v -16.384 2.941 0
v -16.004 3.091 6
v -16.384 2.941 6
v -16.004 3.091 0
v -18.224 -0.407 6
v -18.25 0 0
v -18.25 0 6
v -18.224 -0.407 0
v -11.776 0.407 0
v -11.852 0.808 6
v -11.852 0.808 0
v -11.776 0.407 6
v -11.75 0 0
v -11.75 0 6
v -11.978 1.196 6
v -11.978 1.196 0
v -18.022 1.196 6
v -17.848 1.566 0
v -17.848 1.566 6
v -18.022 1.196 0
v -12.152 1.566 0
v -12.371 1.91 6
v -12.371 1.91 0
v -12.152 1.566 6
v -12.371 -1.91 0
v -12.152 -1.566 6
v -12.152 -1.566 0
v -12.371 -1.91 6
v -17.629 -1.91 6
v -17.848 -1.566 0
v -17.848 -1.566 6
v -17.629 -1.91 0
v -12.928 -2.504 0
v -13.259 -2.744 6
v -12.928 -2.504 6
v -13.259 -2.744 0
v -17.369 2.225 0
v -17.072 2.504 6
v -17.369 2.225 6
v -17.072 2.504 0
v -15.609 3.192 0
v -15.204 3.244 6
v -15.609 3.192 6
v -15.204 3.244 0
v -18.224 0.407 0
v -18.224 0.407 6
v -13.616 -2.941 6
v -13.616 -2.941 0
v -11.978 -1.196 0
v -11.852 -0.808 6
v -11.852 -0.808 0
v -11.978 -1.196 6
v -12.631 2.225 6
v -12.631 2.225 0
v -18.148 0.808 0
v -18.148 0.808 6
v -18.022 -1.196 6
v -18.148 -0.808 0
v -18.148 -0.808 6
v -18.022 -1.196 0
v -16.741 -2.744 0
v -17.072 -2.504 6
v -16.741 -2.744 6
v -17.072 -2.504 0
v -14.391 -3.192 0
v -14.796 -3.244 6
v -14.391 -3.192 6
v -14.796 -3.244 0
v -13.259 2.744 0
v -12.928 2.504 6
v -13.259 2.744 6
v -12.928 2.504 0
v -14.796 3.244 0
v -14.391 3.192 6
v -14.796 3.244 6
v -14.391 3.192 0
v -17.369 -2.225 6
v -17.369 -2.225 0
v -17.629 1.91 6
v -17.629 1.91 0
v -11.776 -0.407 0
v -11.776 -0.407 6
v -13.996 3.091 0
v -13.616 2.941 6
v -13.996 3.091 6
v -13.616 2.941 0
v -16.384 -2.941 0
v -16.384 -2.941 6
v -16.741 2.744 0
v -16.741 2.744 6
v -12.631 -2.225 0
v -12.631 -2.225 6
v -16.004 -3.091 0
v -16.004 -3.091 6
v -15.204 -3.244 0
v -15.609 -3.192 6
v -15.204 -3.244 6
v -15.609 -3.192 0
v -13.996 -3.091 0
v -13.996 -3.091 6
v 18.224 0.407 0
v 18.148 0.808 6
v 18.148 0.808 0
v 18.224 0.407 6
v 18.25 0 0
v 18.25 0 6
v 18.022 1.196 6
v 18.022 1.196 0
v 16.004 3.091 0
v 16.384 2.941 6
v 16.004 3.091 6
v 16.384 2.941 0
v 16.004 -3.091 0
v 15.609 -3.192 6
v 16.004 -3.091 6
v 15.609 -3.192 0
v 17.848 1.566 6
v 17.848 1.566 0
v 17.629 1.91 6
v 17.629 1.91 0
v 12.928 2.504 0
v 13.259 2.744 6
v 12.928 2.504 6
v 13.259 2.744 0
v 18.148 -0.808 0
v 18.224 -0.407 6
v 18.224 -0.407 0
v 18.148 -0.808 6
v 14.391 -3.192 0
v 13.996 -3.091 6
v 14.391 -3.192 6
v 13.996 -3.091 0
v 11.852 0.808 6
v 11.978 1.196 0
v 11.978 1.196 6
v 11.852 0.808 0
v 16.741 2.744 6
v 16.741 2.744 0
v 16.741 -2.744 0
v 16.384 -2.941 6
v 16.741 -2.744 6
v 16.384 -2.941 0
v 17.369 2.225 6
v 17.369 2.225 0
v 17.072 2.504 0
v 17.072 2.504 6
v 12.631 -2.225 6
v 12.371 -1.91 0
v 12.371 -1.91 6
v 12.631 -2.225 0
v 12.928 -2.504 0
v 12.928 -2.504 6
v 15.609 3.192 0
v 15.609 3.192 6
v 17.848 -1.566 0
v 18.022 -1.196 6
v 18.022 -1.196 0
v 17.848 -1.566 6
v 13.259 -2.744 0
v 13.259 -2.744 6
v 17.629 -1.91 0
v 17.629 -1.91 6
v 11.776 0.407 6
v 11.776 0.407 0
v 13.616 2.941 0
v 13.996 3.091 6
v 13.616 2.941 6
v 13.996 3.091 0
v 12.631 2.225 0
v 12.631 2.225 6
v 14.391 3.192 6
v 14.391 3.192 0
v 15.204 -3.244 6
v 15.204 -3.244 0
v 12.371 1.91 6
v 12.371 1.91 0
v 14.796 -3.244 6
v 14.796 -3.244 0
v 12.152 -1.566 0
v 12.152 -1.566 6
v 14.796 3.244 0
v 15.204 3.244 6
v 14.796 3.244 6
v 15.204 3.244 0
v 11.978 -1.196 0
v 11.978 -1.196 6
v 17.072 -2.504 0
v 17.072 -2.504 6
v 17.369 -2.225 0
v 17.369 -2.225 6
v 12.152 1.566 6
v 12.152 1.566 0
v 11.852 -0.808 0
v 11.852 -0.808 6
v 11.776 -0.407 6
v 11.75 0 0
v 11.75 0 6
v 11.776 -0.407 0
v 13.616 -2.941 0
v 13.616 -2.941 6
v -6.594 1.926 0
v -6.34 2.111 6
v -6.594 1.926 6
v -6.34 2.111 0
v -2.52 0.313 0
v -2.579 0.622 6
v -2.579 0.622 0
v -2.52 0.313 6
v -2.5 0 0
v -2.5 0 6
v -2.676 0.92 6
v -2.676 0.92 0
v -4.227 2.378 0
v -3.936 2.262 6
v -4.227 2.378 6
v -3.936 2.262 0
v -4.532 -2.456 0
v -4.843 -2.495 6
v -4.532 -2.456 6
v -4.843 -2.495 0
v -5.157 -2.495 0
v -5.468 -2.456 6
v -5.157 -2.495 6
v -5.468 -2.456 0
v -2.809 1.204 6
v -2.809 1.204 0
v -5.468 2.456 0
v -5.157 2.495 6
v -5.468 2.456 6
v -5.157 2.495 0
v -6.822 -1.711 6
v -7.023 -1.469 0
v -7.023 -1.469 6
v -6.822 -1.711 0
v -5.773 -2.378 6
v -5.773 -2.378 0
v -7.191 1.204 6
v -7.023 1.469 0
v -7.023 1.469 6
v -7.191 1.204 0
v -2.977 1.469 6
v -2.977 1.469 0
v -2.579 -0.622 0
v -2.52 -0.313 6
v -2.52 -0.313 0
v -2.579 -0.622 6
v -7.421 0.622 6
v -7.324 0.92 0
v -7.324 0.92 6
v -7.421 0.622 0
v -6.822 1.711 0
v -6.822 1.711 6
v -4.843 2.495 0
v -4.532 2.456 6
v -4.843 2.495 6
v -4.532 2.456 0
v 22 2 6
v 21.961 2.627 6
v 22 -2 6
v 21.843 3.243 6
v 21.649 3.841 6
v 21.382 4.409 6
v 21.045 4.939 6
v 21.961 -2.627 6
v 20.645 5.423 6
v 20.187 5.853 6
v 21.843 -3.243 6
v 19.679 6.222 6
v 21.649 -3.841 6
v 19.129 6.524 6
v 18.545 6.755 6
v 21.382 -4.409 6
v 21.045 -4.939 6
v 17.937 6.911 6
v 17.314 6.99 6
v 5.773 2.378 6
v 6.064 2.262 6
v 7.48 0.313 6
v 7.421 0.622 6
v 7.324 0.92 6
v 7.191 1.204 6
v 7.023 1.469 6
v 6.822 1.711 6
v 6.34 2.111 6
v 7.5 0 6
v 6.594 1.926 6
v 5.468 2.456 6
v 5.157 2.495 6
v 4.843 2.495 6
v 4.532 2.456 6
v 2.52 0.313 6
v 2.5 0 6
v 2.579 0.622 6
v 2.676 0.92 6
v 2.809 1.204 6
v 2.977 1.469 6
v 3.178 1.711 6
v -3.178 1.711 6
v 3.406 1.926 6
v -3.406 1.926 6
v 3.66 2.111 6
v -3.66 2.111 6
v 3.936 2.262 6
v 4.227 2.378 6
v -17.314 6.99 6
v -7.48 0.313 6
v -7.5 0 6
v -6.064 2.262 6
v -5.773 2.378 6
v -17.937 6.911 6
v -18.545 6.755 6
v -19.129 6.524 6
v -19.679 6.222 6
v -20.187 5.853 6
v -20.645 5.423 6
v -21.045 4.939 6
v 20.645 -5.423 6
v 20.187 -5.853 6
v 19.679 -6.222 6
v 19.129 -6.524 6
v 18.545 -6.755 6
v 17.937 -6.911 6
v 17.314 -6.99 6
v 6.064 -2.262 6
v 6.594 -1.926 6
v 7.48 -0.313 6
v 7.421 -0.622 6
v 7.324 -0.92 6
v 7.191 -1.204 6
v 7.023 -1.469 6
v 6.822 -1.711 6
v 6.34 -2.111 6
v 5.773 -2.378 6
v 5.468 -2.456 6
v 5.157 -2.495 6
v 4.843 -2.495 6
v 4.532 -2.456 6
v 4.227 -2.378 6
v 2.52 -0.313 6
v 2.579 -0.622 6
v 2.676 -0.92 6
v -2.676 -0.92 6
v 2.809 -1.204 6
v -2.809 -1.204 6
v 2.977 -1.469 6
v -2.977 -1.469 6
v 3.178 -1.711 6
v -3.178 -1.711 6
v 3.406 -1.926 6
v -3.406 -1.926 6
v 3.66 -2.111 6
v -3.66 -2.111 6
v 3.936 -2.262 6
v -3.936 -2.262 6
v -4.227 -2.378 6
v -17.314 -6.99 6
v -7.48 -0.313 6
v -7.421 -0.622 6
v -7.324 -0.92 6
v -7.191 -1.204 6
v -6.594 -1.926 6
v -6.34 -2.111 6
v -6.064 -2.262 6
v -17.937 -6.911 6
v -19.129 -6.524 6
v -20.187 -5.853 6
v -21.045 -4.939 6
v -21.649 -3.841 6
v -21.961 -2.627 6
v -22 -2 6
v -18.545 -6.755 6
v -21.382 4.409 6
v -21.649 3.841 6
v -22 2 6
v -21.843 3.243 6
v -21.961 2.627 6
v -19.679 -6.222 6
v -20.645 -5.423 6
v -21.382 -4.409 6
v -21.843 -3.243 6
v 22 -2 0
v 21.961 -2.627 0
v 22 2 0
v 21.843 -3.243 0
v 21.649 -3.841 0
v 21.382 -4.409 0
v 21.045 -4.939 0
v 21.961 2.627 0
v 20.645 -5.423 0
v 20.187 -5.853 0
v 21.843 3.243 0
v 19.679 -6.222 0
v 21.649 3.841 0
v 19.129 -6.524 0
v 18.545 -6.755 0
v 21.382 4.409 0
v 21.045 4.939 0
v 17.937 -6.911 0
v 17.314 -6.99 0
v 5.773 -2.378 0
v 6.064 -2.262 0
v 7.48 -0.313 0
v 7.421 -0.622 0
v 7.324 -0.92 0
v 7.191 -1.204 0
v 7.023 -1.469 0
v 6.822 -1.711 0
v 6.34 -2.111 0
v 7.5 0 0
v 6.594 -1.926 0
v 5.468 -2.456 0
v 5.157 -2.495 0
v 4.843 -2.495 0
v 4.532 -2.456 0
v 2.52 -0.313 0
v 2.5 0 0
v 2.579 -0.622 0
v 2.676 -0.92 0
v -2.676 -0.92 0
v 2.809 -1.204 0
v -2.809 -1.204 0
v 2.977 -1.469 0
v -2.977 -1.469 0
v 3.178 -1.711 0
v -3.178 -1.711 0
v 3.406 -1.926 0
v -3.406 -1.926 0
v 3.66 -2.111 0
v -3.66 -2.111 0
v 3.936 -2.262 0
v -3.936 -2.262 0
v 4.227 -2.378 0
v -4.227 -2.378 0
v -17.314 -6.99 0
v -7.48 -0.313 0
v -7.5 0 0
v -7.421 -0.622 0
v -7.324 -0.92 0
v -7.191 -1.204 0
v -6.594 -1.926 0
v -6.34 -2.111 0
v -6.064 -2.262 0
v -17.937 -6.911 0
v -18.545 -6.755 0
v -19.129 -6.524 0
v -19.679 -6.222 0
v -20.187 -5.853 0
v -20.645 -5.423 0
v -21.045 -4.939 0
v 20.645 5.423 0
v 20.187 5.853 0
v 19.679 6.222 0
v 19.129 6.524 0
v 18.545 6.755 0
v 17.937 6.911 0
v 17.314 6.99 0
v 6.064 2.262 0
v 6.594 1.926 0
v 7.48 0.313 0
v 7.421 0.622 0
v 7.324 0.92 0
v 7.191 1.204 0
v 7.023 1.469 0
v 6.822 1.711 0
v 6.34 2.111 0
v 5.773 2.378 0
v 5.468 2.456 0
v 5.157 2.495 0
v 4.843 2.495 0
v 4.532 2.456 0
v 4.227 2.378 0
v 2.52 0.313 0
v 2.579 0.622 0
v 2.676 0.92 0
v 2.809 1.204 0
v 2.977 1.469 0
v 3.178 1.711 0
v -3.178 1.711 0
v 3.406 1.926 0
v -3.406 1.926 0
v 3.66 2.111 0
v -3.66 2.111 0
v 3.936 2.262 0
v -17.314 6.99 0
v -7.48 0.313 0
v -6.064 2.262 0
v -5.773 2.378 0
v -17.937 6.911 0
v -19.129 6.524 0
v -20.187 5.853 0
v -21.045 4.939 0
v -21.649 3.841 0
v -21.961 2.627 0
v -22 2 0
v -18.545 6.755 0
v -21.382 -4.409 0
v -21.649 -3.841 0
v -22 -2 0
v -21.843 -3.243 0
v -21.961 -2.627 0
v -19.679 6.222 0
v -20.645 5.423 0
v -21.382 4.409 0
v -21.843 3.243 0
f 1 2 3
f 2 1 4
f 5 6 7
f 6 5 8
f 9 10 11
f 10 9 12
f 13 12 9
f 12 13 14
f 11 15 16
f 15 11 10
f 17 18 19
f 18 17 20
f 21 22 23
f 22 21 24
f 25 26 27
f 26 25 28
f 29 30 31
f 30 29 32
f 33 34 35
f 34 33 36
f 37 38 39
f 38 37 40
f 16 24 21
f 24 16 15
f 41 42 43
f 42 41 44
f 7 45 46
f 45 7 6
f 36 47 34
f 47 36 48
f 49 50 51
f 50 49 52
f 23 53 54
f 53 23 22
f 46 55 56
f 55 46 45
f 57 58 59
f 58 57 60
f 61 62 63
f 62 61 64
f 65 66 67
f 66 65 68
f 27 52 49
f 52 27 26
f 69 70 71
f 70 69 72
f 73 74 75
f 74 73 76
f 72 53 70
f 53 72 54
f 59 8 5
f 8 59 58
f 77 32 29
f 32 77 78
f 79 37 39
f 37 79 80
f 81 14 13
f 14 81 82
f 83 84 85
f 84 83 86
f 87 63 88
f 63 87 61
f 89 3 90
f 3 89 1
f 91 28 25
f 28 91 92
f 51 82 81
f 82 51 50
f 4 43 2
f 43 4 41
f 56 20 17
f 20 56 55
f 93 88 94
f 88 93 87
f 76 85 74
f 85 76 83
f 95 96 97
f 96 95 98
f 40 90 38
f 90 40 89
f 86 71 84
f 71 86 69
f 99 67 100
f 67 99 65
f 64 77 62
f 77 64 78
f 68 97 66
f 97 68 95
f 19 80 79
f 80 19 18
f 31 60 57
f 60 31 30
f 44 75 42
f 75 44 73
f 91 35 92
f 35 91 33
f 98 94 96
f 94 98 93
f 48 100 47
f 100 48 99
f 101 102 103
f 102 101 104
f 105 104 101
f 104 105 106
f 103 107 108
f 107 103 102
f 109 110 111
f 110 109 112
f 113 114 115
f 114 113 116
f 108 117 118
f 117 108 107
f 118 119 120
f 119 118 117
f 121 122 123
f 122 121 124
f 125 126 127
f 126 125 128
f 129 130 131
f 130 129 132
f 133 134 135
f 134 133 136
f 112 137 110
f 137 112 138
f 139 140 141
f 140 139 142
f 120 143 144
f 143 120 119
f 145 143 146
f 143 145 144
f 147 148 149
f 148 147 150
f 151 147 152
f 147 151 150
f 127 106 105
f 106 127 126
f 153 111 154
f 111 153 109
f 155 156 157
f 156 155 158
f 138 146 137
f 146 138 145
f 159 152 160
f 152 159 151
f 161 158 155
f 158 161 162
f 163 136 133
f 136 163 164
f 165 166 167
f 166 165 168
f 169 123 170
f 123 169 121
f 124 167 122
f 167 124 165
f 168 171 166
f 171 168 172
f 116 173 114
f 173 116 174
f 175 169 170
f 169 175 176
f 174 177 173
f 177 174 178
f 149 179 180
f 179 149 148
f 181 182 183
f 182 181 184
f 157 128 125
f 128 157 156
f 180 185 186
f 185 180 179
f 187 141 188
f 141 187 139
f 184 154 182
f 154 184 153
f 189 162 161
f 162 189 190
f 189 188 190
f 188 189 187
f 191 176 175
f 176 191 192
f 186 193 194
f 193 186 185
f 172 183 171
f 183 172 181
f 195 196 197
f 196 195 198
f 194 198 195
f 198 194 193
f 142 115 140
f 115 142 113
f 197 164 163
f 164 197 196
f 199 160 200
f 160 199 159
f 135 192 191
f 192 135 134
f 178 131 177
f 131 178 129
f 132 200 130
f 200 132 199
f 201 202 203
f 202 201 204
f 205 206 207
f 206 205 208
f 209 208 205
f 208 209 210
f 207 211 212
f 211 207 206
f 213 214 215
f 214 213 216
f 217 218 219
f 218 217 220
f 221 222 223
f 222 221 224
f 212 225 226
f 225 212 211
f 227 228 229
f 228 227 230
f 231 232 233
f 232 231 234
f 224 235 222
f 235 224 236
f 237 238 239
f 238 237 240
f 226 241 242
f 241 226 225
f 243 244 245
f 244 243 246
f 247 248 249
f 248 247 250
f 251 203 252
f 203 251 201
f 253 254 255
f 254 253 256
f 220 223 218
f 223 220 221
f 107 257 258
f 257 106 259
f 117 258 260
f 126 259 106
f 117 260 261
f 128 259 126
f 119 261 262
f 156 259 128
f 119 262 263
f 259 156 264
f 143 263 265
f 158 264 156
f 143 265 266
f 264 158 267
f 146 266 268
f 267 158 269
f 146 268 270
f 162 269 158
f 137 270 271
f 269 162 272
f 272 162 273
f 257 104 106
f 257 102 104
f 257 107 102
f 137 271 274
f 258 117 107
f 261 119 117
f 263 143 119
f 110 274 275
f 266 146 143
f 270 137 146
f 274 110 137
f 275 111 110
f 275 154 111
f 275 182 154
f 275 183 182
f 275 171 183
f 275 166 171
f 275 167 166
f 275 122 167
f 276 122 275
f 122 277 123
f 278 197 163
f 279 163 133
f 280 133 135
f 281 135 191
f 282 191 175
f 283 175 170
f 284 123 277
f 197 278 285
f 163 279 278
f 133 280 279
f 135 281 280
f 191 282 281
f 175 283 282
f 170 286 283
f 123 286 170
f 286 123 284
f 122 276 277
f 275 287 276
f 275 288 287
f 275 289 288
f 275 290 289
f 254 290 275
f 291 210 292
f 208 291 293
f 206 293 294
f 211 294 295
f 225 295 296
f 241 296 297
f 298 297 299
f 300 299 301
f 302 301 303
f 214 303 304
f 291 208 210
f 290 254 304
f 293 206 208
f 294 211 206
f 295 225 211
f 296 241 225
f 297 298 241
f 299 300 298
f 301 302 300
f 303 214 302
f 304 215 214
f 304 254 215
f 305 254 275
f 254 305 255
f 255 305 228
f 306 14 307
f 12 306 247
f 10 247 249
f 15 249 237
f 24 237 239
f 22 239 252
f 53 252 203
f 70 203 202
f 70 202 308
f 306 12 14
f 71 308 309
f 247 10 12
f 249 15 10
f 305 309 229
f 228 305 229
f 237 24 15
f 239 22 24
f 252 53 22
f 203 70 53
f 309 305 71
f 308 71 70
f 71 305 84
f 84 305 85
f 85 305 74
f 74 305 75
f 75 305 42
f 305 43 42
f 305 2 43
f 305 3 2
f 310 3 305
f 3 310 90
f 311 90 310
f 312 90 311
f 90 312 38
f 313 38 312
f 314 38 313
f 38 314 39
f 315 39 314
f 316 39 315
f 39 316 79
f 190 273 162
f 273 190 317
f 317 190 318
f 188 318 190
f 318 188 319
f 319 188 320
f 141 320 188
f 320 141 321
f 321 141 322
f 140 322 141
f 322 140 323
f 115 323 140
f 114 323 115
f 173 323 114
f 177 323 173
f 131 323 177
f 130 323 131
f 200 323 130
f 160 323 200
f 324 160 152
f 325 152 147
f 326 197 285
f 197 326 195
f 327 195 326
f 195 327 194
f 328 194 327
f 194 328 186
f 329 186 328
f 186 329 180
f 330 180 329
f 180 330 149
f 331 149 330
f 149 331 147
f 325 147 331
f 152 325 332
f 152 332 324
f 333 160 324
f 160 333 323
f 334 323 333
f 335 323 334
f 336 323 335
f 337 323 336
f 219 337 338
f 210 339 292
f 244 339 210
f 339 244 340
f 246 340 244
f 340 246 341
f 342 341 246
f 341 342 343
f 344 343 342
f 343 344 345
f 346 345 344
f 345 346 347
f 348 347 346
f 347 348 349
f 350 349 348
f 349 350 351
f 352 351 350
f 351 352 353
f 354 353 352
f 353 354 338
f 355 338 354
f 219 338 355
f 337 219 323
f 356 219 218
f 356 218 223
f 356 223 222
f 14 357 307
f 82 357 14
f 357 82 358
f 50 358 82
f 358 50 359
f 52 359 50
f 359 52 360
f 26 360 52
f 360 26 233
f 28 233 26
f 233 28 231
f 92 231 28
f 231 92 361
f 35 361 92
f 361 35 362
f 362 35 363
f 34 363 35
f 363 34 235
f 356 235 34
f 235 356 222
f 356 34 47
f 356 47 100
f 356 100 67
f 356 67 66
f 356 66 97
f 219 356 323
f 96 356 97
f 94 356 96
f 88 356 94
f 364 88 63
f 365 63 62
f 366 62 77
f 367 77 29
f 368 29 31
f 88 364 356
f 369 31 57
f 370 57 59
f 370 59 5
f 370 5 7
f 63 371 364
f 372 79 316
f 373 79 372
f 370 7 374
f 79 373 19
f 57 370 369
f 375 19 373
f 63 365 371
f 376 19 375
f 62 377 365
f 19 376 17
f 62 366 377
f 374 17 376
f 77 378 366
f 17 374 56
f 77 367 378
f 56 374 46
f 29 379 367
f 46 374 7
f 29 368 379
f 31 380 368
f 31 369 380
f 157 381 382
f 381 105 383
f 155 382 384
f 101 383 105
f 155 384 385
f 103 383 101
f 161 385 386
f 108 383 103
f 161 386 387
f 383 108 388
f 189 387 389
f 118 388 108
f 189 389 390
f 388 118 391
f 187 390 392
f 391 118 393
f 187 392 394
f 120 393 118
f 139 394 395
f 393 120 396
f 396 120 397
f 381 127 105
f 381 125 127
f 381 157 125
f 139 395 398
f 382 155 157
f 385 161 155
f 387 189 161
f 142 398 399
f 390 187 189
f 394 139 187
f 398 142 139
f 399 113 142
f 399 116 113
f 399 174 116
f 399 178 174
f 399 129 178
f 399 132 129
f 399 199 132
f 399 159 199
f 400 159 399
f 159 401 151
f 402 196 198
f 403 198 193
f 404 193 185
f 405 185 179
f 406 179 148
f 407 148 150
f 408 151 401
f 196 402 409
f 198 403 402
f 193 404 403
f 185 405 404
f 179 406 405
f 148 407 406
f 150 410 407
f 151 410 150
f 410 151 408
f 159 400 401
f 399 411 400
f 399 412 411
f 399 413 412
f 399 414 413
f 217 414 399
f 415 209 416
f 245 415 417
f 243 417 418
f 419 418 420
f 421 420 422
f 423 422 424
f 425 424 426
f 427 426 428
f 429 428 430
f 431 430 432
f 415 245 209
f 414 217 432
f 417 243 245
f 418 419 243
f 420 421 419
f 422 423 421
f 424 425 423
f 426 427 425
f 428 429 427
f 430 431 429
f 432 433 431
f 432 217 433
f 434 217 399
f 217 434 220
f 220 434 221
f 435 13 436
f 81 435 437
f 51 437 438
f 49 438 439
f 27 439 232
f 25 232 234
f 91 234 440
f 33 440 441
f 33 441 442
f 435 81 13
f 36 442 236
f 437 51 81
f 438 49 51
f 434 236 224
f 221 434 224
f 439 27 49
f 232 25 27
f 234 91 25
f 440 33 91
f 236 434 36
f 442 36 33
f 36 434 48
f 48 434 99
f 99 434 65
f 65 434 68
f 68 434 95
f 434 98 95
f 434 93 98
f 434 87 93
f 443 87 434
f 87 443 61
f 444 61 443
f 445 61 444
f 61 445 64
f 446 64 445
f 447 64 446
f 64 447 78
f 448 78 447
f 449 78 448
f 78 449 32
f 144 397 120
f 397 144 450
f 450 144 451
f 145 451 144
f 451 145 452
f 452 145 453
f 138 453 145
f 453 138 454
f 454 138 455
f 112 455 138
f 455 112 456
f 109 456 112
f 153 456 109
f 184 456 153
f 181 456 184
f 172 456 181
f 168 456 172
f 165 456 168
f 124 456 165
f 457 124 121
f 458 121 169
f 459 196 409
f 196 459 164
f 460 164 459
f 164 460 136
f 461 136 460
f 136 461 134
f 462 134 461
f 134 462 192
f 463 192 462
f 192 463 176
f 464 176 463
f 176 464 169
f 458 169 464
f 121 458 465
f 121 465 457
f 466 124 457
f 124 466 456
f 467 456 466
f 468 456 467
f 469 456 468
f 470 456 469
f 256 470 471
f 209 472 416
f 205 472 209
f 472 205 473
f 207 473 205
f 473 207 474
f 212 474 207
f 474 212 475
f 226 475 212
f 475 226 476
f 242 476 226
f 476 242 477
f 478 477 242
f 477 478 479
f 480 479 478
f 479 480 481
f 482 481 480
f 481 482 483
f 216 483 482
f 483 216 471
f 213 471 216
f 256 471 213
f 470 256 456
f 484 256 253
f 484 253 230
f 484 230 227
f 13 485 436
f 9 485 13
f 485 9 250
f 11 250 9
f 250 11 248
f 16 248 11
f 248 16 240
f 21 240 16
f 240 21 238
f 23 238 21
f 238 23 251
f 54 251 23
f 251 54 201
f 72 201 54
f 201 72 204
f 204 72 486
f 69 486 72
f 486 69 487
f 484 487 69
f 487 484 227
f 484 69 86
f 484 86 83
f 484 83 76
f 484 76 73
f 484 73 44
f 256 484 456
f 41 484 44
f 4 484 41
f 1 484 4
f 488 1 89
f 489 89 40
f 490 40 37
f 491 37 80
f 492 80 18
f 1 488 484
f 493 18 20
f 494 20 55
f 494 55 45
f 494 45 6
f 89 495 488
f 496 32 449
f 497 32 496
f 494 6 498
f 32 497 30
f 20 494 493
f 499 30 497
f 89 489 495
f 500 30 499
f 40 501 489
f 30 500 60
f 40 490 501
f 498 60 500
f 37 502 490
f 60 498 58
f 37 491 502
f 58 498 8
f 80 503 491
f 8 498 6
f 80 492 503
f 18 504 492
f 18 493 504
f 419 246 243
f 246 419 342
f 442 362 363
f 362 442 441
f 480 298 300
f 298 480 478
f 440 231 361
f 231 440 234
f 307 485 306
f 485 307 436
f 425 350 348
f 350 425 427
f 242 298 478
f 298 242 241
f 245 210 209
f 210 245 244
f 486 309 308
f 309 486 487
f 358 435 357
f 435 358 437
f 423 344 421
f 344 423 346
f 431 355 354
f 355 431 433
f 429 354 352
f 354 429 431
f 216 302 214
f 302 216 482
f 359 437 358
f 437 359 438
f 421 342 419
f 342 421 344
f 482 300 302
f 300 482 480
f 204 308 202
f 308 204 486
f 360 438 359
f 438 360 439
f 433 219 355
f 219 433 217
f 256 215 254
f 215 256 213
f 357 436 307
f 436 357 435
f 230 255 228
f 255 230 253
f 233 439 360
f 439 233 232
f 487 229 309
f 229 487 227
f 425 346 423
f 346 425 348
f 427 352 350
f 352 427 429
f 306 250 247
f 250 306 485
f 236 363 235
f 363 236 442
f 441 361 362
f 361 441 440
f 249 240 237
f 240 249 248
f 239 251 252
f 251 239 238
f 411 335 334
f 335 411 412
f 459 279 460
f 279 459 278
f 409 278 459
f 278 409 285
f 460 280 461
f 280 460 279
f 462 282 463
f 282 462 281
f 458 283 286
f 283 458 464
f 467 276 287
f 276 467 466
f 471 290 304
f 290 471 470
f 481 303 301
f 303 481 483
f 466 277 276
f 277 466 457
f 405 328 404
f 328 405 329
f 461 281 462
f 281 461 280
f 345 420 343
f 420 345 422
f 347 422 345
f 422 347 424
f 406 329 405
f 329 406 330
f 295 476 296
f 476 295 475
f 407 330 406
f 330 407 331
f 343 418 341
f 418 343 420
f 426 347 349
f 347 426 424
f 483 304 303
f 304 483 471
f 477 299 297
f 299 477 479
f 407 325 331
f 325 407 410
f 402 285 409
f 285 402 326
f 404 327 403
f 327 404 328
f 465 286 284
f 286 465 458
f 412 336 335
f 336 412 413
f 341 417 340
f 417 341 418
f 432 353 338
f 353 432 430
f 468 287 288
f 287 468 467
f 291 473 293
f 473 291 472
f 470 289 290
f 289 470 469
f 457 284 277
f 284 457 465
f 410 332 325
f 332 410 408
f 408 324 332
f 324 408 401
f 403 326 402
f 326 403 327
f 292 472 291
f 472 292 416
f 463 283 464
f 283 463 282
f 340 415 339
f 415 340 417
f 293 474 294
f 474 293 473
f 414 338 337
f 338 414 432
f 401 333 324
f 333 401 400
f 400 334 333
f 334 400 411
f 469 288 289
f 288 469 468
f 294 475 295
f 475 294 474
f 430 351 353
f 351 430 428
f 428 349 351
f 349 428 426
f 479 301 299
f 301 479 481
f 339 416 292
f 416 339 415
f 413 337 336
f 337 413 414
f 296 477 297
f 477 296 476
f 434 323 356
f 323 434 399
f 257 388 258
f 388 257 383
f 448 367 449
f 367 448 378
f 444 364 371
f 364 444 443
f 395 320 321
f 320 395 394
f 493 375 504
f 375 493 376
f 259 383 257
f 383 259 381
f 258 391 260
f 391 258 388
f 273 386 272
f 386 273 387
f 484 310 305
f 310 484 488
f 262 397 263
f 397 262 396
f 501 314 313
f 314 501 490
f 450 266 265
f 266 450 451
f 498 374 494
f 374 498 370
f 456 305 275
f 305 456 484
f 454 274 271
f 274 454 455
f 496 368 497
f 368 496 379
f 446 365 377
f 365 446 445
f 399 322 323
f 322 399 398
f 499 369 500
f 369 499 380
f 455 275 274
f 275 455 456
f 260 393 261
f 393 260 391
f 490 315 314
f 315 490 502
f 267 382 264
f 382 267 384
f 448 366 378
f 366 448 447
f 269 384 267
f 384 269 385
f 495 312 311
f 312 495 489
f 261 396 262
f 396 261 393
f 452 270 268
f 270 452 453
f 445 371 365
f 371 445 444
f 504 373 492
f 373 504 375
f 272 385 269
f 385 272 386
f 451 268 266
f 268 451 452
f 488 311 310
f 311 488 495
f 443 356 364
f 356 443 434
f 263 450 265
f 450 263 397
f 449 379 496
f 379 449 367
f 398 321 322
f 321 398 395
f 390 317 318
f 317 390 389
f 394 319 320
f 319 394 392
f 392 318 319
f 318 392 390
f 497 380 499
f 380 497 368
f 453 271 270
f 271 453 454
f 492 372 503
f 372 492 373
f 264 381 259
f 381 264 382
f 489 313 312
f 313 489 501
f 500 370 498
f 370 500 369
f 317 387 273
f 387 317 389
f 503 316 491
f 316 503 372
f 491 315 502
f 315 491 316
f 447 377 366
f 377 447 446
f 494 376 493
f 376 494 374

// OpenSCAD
$fn = 50;

difference() {
	union() {
		hull() {
			translate(v = [-17.0, 2.0, 0]) {
				cylinder(h = 6, r = 5);
			}
			translate(v = [17.0, 2.0, 0]) {
				cylinder(h = 6, r = 5);
			}
			translate(v = [-17.0, -2.0, 0]) {
				cylinder(h = 6, r = 5);
			}
			translate(v = [17.0, -2.0, 0]) {
				cylinder(h = 6, r = 5);
			}
		}
	}
	union() {
		translate(v = [-15.0, 0.0, -100.0]) {
			cylinder(h = 200, r = 3.25);
		}
		translate(v = [15.0, 0.0, -100.0]) {
			cylinder(h = 200, r = 3.25);
		}
		translate(v = [-15.0, 0.0, -100.0]) {
			cylinder(h = 200, r = 1.8);
		}
		translate(v = [15.0, 0.0, -100.0]) {
			cylinder(h = 200, r = 1.8);
		}
		translate(v = [-15.0, 0, 0.0]) {
			cylinder(h = 6, r = 2.5);
		}
		translate(v = [-5.0, 0, 0.0]) {
			cylinder(h = 6, r = 2.5);
		}
		translate(v = [5.0, 0, 0.0]) {
			cylinder(h = 6, r = 2.5);
		}
		translate(v = [15.0, 0, 0.0]) {
			cylinder(h = 6, r = 2.5);
		}
	}
}
